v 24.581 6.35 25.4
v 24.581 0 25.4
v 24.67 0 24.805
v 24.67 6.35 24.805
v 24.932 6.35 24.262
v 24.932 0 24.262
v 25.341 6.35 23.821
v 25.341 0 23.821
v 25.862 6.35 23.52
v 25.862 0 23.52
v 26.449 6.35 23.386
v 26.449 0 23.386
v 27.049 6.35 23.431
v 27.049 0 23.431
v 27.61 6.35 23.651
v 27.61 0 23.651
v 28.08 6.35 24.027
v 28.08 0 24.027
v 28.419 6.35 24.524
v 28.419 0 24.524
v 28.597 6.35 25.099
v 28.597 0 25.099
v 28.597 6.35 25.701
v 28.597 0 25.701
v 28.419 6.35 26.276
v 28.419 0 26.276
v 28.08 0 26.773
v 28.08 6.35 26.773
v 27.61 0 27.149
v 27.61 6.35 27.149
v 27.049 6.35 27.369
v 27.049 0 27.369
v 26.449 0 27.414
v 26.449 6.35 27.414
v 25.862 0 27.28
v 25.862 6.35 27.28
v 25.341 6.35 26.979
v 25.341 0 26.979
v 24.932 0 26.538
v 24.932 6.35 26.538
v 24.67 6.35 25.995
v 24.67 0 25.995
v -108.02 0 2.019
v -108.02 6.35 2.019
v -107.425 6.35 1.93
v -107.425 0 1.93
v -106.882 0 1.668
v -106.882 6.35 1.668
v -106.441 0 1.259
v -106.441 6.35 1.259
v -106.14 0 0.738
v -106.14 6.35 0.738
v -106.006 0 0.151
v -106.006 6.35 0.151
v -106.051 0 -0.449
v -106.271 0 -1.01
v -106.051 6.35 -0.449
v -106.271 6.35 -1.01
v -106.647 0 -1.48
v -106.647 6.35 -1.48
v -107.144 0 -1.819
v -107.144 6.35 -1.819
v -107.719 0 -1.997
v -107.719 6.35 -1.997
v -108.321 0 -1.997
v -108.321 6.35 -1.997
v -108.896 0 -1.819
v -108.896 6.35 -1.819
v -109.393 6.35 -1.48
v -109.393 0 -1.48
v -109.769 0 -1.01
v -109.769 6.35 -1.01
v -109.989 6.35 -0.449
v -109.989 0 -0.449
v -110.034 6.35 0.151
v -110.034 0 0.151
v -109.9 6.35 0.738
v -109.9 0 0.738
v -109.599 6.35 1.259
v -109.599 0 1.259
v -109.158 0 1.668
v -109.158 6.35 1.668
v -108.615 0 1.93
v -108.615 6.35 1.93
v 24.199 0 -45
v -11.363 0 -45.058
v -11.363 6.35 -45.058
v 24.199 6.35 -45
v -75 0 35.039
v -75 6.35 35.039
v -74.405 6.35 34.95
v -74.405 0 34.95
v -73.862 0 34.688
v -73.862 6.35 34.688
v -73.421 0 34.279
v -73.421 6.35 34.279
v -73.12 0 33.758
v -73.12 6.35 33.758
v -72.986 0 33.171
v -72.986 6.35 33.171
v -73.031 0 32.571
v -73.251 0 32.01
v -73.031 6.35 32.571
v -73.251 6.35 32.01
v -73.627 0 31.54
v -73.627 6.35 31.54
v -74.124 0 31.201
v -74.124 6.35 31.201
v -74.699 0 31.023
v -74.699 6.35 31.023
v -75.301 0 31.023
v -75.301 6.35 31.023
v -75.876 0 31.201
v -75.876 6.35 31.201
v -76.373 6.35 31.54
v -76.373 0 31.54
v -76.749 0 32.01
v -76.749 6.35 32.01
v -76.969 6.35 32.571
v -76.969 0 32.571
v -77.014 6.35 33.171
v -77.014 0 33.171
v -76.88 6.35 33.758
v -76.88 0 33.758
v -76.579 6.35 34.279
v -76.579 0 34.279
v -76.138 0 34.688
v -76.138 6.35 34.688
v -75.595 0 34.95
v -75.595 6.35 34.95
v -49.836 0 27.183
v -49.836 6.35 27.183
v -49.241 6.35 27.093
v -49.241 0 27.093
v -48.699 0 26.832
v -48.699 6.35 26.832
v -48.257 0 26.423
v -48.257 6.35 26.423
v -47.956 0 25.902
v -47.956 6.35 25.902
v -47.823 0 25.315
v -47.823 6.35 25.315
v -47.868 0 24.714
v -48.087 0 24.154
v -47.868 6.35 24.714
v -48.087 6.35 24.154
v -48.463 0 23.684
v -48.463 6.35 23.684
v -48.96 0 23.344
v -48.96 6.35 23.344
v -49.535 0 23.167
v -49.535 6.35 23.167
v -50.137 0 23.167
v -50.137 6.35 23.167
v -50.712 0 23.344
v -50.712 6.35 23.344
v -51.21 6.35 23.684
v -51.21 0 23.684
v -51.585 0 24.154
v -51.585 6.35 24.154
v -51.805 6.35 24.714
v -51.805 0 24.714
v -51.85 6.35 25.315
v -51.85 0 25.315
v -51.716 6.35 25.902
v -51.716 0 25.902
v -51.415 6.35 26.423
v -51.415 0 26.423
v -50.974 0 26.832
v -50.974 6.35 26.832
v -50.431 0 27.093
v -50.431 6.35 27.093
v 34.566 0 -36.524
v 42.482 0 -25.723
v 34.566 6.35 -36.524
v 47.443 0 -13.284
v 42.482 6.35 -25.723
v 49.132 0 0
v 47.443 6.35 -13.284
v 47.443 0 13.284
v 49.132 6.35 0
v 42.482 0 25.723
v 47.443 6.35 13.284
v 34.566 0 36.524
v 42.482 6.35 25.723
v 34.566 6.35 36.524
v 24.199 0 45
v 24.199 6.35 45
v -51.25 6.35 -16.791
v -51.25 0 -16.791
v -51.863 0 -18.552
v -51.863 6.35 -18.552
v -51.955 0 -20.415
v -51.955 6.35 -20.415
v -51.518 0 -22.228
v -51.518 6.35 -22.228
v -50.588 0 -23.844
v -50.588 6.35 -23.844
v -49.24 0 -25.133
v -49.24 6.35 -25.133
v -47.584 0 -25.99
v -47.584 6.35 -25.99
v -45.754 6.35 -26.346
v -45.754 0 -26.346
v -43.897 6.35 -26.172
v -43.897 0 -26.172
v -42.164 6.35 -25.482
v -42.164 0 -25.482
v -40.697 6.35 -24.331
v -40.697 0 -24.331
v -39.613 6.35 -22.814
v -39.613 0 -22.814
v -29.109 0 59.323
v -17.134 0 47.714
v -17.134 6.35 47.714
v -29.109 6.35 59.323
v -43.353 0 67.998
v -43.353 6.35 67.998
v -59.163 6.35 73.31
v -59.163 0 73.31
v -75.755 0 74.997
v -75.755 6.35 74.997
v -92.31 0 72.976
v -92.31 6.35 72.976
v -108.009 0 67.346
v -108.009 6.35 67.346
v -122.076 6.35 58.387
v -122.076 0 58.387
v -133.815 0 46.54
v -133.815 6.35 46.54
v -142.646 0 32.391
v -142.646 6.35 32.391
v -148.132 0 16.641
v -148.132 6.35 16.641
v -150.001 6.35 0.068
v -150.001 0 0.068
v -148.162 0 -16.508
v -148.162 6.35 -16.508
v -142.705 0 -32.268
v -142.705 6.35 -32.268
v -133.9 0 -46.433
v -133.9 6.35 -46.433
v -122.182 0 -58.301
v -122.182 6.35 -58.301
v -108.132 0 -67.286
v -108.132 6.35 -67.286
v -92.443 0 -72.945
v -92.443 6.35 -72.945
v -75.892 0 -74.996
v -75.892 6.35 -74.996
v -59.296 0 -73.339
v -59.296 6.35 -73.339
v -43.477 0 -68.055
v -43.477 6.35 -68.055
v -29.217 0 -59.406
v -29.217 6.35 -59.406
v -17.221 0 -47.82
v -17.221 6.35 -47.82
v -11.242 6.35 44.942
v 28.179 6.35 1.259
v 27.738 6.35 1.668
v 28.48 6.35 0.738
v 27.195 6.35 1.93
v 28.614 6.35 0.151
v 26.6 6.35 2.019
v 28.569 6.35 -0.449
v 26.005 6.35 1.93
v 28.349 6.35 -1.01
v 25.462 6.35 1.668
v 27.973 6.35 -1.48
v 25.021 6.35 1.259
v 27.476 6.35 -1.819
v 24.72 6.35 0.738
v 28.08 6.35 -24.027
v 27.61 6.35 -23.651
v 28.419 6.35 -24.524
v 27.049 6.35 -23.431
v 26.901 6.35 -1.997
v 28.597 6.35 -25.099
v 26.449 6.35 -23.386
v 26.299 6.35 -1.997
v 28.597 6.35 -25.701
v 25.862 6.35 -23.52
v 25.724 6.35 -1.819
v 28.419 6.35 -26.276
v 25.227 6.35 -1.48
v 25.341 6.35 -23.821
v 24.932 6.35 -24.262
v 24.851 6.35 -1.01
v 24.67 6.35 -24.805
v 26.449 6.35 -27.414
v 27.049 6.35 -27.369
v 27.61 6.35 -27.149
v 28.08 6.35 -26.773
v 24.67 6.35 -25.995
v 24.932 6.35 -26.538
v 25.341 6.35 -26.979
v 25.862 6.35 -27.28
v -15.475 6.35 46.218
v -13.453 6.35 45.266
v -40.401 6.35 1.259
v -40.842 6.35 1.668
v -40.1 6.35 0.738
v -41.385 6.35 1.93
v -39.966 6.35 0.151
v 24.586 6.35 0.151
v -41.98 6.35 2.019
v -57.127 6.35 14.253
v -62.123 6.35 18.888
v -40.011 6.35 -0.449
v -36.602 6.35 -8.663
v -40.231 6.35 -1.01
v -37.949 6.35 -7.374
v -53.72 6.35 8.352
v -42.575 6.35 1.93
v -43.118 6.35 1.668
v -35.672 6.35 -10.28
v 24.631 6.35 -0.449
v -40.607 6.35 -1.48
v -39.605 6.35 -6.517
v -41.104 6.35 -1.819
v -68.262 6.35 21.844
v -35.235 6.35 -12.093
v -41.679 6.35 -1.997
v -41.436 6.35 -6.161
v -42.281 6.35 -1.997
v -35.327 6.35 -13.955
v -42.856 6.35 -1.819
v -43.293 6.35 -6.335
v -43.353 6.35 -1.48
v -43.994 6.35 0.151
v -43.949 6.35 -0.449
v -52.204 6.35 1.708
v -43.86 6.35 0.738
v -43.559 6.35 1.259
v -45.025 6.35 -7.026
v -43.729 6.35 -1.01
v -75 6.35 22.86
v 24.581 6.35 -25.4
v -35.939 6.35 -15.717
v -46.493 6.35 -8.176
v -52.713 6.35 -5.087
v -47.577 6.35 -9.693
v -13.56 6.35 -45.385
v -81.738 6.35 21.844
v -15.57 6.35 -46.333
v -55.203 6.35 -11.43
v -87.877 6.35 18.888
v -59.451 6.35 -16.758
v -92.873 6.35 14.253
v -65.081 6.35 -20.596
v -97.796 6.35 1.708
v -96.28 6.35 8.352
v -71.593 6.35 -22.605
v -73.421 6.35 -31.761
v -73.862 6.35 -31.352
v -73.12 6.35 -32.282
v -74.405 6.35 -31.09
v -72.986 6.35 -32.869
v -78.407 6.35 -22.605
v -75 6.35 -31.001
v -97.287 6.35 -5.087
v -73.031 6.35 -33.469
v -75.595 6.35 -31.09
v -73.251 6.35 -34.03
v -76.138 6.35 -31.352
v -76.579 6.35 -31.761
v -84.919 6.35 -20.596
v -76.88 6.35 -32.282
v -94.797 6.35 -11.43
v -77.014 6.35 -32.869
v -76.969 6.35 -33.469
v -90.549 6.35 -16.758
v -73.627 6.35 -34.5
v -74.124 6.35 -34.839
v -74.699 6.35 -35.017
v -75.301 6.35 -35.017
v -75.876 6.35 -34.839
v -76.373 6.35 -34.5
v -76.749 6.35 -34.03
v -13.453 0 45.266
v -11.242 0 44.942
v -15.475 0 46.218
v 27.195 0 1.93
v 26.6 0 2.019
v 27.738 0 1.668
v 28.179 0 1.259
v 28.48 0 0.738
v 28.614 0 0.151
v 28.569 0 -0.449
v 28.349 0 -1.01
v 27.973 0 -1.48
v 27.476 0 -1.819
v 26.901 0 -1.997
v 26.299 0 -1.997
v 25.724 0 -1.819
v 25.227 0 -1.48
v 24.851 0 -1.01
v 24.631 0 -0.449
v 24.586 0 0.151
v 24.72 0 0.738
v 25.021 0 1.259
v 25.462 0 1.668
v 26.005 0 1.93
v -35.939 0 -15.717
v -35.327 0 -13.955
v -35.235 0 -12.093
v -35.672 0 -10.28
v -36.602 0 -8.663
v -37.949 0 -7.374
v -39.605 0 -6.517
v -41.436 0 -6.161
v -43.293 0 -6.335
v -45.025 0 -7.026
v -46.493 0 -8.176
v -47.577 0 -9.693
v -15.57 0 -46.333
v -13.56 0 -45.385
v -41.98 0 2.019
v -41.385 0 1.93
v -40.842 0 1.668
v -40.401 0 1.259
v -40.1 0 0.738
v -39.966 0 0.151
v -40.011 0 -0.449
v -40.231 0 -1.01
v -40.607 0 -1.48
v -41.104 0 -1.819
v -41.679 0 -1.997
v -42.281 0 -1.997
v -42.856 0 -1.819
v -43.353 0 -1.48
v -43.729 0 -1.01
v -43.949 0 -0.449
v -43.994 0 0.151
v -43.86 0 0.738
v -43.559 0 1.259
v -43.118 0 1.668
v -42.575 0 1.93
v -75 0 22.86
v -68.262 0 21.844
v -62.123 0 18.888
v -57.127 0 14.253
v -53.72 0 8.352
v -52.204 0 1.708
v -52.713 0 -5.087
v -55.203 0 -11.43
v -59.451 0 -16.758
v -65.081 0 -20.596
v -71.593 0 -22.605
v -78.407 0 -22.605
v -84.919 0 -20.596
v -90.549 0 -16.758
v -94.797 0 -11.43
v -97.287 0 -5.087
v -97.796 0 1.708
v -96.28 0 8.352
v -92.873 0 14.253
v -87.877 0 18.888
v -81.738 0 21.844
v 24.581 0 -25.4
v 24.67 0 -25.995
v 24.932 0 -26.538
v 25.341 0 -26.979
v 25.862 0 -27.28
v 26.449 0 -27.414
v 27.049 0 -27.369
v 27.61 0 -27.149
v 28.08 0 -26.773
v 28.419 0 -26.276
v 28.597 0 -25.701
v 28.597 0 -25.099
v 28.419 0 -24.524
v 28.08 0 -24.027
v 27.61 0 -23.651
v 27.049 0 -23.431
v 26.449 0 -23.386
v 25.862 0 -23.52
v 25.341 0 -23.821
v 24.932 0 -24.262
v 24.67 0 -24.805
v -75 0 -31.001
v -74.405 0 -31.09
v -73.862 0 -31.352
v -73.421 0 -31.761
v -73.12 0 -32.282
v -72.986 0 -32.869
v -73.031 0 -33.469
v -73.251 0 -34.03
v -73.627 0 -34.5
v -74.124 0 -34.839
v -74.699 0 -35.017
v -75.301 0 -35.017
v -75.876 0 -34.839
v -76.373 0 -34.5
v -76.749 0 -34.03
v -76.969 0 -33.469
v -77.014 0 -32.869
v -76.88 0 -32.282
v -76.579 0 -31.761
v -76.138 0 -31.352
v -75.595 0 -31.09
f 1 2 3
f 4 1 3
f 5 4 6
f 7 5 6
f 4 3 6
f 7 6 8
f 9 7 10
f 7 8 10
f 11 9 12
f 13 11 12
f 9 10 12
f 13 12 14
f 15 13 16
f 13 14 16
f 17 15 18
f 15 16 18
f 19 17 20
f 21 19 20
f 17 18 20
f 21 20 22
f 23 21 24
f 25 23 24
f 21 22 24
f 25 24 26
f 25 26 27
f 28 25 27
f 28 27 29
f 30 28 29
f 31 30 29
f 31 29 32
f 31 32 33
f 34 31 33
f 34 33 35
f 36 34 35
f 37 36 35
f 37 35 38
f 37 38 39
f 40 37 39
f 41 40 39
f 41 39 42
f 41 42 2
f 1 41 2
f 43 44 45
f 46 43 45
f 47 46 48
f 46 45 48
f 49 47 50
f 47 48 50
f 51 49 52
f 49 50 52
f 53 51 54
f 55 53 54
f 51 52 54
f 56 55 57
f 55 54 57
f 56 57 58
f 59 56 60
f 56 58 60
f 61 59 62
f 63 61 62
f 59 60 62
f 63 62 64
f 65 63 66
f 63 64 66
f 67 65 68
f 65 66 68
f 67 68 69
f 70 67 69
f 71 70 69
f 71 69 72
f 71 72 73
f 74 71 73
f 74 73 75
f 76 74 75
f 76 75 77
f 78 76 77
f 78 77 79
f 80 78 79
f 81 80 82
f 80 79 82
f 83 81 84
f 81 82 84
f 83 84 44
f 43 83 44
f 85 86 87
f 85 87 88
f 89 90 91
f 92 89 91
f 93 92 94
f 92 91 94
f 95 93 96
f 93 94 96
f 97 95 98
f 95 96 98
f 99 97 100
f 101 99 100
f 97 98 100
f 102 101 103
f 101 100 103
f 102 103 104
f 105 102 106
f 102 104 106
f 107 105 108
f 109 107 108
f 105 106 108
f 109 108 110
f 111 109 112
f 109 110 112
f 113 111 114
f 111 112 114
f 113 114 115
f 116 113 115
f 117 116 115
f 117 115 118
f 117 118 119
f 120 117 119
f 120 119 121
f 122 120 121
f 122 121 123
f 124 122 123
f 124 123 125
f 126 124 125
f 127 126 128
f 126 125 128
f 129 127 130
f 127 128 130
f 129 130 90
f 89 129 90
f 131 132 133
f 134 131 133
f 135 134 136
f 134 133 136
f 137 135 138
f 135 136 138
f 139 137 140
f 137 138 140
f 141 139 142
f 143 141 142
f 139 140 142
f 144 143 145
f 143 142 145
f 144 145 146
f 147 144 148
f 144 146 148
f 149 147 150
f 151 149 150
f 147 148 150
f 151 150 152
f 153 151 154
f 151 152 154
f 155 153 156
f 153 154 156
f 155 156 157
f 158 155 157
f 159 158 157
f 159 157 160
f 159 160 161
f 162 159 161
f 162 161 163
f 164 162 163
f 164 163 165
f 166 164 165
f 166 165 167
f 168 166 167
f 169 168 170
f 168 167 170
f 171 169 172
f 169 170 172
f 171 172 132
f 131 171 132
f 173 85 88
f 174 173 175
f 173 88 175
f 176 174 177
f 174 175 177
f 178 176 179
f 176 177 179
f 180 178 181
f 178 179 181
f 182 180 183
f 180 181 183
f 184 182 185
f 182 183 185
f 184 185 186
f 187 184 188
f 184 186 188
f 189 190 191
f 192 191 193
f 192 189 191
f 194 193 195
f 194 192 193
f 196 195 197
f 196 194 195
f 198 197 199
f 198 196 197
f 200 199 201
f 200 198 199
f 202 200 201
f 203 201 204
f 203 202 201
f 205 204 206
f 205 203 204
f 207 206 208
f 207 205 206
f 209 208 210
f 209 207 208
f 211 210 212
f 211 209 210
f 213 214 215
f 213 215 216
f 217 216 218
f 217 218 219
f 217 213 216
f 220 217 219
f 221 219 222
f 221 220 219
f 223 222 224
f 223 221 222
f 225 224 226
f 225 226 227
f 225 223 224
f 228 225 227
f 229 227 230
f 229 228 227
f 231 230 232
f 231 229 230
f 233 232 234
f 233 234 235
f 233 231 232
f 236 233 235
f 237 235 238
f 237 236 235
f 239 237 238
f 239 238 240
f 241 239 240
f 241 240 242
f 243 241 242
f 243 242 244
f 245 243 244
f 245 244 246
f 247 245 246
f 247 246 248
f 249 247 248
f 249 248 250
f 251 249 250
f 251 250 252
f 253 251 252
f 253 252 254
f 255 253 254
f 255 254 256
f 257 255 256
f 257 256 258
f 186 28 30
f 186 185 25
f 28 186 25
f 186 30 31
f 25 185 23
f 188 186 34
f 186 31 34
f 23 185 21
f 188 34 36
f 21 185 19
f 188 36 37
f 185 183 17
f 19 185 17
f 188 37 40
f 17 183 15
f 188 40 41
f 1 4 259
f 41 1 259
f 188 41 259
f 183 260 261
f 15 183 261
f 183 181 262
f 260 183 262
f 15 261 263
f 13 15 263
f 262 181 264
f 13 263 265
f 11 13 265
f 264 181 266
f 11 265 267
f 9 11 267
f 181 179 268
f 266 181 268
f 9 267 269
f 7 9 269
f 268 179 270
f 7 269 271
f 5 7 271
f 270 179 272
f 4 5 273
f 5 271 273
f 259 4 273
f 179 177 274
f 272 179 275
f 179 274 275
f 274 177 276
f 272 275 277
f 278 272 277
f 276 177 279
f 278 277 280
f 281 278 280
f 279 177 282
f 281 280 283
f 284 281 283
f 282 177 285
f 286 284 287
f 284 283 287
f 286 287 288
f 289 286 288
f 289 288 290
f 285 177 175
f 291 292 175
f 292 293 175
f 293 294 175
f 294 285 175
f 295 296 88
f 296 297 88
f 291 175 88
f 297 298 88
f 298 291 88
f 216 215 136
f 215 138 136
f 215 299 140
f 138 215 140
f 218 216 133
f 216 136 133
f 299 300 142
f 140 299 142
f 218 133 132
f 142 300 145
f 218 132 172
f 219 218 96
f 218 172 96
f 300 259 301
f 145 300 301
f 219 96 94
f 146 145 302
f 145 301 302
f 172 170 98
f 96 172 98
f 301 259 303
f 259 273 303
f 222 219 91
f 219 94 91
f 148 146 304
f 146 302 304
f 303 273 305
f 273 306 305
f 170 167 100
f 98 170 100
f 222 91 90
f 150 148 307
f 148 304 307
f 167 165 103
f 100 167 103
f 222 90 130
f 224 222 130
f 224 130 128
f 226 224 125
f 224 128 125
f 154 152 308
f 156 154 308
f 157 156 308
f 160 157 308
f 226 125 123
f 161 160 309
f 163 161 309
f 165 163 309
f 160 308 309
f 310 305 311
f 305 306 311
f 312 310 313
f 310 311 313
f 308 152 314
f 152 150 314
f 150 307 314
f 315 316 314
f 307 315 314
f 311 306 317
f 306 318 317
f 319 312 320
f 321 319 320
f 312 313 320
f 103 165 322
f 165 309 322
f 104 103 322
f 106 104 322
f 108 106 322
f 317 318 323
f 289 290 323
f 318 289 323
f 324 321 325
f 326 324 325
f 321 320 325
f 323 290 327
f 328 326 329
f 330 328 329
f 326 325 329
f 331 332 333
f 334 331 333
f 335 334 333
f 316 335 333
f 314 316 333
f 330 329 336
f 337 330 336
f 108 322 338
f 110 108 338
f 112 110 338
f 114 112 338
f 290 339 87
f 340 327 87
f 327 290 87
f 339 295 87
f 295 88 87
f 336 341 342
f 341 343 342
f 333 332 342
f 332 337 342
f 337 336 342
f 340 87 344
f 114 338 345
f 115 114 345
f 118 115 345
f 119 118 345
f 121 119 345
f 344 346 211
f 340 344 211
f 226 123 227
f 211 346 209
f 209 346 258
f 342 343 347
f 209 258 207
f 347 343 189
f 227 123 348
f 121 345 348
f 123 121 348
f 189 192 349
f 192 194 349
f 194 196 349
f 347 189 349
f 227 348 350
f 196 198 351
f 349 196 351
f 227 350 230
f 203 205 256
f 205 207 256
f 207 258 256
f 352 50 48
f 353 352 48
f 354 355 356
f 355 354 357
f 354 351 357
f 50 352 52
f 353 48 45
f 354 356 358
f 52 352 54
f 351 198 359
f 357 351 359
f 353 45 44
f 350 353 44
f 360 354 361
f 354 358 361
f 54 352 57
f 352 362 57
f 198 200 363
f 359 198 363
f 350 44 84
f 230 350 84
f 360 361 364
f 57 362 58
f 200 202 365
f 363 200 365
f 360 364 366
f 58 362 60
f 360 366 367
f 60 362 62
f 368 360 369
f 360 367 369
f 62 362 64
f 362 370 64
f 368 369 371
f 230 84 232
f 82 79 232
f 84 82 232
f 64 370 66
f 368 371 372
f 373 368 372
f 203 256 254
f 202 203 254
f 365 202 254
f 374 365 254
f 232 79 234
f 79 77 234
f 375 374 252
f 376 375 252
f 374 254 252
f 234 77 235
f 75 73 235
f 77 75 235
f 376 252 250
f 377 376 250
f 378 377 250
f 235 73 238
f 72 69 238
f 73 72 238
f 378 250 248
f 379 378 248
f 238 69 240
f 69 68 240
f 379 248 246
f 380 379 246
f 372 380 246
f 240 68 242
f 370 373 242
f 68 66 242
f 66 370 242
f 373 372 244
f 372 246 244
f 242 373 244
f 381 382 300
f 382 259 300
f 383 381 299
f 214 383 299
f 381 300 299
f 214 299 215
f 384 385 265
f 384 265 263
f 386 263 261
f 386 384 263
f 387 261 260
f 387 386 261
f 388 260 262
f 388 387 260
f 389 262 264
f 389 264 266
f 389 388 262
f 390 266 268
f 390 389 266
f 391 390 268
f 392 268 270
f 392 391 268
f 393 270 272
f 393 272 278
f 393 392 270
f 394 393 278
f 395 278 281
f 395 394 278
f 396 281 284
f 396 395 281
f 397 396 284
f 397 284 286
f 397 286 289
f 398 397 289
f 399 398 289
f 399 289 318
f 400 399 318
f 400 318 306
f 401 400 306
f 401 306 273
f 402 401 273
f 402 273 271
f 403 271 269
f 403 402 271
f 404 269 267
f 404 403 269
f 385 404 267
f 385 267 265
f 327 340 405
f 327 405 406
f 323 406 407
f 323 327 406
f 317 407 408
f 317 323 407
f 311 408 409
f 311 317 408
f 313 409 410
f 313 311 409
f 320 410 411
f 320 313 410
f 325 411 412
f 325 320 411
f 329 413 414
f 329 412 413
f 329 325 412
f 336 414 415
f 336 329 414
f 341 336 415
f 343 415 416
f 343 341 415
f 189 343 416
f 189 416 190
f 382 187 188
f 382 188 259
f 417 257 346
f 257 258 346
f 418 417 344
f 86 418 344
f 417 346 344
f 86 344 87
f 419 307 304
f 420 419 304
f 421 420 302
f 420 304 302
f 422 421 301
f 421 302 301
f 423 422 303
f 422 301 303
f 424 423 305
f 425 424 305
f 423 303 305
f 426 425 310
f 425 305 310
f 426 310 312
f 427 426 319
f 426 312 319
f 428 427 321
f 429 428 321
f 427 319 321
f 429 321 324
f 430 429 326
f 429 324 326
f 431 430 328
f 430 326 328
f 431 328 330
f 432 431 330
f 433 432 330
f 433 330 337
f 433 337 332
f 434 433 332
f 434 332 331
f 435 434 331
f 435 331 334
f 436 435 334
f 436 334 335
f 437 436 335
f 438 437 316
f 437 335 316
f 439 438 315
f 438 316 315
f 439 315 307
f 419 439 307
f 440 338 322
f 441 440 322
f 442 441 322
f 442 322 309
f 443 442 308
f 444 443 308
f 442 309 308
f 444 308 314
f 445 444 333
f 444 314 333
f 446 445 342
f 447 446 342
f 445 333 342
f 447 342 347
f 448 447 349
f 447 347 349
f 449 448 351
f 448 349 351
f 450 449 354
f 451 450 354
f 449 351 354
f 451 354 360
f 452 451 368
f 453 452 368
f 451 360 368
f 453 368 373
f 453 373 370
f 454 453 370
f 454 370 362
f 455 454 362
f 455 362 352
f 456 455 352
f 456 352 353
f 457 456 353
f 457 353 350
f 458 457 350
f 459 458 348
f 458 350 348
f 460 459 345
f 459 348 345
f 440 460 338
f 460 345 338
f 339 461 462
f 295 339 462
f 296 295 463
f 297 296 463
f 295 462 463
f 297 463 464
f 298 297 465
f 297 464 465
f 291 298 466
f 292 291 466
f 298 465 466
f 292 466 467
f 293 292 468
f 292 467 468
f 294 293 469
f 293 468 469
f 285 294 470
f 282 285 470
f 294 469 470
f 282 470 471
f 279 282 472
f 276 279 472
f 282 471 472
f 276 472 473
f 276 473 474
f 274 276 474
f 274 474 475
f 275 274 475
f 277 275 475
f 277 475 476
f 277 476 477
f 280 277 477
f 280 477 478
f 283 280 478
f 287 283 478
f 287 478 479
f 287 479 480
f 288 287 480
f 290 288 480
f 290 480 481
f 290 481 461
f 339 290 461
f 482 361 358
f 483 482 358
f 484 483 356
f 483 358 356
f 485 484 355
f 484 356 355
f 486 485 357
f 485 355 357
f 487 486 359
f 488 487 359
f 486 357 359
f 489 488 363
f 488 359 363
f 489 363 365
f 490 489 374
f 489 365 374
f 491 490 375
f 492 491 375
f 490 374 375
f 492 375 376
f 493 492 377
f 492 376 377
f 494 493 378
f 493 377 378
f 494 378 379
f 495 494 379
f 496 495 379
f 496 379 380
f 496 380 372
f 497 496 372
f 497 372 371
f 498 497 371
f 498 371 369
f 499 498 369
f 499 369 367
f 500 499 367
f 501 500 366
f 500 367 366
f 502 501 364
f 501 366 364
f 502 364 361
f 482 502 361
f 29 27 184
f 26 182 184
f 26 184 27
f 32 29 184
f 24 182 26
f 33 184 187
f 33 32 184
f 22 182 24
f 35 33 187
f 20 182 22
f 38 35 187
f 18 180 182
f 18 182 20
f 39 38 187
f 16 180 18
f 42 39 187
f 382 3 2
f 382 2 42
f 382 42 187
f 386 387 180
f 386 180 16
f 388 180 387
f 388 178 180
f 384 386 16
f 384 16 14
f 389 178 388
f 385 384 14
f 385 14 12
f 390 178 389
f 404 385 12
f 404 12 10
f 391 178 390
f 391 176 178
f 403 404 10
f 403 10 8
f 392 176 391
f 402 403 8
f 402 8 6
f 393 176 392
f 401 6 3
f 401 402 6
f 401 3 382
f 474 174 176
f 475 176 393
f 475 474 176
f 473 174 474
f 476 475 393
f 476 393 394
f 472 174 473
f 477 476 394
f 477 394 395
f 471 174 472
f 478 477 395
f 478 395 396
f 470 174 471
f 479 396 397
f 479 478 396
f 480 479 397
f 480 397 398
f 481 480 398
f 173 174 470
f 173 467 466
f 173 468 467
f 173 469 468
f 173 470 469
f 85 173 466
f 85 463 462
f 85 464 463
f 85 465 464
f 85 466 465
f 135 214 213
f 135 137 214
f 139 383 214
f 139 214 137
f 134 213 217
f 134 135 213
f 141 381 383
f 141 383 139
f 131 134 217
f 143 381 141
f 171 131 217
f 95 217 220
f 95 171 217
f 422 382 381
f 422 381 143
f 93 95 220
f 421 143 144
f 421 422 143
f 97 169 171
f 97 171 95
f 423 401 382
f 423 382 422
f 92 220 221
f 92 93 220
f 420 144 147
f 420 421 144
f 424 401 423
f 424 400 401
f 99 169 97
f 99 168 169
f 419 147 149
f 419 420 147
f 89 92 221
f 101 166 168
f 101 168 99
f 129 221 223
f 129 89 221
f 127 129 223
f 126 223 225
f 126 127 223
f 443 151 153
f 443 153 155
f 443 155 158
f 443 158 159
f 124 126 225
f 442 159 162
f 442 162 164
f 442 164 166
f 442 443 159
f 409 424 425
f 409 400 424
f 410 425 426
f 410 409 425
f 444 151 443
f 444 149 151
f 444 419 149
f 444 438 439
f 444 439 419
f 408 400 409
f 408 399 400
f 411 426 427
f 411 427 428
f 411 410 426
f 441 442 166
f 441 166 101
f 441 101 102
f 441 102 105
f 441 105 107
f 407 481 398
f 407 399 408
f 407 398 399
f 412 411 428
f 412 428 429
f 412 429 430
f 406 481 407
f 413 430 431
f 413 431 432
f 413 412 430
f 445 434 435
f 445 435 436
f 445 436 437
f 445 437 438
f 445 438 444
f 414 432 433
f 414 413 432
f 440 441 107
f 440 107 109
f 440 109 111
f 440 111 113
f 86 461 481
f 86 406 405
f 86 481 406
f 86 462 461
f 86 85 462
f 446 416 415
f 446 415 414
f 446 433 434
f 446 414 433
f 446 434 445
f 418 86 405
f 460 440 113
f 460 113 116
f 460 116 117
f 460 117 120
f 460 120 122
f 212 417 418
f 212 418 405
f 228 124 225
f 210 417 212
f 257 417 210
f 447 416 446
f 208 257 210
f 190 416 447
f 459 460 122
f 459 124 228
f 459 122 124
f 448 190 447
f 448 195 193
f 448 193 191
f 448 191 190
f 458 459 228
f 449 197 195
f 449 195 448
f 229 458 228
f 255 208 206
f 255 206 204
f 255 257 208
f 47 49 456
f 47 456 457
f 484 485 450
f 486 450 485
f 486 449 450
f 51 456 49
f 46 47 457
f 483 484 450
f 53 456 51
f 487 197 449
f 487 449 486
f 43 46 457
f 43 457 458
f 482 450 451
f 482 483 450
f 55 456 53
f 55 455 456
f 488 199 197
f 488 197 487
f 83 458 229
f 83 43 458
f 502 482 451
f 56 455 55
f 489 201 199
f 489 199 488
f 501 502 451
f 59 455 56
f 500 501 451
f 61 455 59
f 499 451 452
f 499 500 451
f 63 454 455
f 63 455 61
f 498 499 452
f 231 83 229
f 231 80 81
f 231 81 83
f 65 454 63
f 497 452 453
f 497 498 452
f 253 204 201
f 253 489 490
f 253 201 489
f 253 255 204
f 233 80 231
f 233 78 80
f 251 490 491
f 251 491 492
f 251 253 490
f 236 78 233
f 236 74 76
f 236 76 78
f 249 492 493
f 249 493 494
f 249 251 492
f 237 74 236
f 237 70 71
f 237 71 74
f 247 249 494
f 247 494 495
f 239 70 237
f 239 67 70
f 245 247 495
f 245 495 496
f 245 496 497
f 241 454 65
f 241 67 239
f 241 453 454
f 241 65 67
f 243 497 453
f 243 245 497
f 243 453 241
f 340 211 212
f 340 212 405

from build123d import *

# Parameters (mm, degrees)
SKETCH1_R                   = 2.0193
BOSS_EXTRUDE1_DEPTH         = 6.35
SKETCH16_R                  = 22.86
SKETCH16_R_2                = 2.0193
CUT_EXTRUDE1_DEPTH          = 6.35
FILLET1_R                   = 7.62
F_21_0_159_DIAMETER_HOLE1_D = 4.0386
CUT_EXTRUDE2_DEPTH          = 168.826775285
CUT_EXTRUDE3_DEPTH          = 168.826775285


with BuildPart() as part:
    # Sketch1 → Boss-Extrude1 (new body)
    with BuildSketch(Plane(origin=(0, 0, 0), x_dir=(1, 0, 0), z_dir=(0, 1, 0))):
        with BuildLine():
            Line((24.199172761, -44.999955873), (-14.950739381, -44.936113543))
            ThreePointArc((-14.950739381, -44.936113543), (-150.001077441, -0.07990002), (-15.0466181, 45.063954554))
            Line((-15.0466181, 45.063954554), (24.199172761, 44.999955873))
            ThreePointArc((24.199172761, 44.999955873), (71.663954553, 0), (24.199172761, -44.999955873))
        make_face()
        with Locations(Location((26.6, 0, 0), (0, 0, 270))):
            Circle(SKETCH1_R, mode=Mode.SUBTRACT)
    extrude(amount=BOSS_EXTRUDE1_DEPTH)

    # Sketch16 → Cut-Extrude1 (cut)
    with BuildSketch(Plane(origin=(0.964771866, 6.35, 105.934324836), x_dir=(-1, 0, 0), z_dir=(0, 1, 0))):
        with Locations(Location((75.964771866, -105.934324836, 0), (0, 0, 90))):
            Circle(SKETCH16_R)
        with Locations(Location((50.800979112, -80.770532082, 0), (0, 0, 90))):
            Circle(SKETCH16_R_2)
        with Locations(Location((42.944771866, -105.934324836, 0), (0, 0, 90))):
            Circle(SKETCH16_R_2)
        with Locations(Location((75.964771866, -72.914324836, 0), (0, 0, 90))):
            Circle(SKETCH16_R_2)
        with Locations(Location((108.984771866, -105.934324836, 0), (0, 0, 90))):
            Circle(SKETCH16_R_2)
        with Locations(Location((75.964771866, -138.954324836, 0), (0, 0, 90))):
            Circle(SKETCH16_R_2)
    extrude(amount=-CUT_EXTRUDE1_DEPTH, mode=Mode.SUBTRACT)

    # Fillet1
    fillet1_edges = [part.edges().sort_by_distance(p)[0] for p in [
        (-15.0466181, 3.175, -45.063954554),
        (-14.950739381, 3.175, 44.936113543),
    ]]
    fillet(fillet1_edges, radius=FILLET1_R)

    # #21 (0.159) Diameter Hole1 (through all)
    with Locations(Plane(origin=(0, 6.35, 0), x_dir=(1, 0, 0), z_dir=(0, 1, 0))):
        with Locations((26.6, 25.4), (26.6, -25.4)):
            Hole(F_21_0_159_DIAMETER_HOLE1_D / 2)

    # Sketch19 → Cut-Extrude2 (cut, through all)
    with BuildSketch(Plane(origin=(0, 6.35, 0), x_dir=(1, 0, 0), z_dir=(0, 1, 0))):
        with BuildLine():
            ThreePointArc((24.199172761, 44.999955873), (49.131977277, 0), (24.199172761, -44.999955873))
            ThreePointArc((24.199172761, -44.999955873), (71.663954553, 0), (24.199172761, 44.999955873))
        make_face()
    extrude(amount=-CUT_EXTRUDE2_DEPTH, mode=Mode.SUBTRACT)

    # Sketch20 → Cut-Extrude3 (cut, through all)
    with BuildSketch(Plane(origin=(0, 6.35, 0), x_dir=(1, 0, 0), z_dir=(0, 1, 0))):
        with BuildLine():
            Line((-39.61253295, 22.813806704), (-35.939374007, 15.716554888))
            ThreePointArc((-35.939374007, 15.716554888), (-38.746700574, 6.886169325), (-47.577086137, 9.693495892))
            Line((-47.577086137, 9.693495892), (-51.25024508, 16.790747709))
            ThreePointArc((-51.25024508, 16.790747709), (-48.442918513, 25.621133271), (-39.61253295, 22.813806704))
        make_face()
    extrude(amount=-CUT_EXTRUDE3_DEPTH, mode=Mode.SUBTRACT)


solid = part.part
